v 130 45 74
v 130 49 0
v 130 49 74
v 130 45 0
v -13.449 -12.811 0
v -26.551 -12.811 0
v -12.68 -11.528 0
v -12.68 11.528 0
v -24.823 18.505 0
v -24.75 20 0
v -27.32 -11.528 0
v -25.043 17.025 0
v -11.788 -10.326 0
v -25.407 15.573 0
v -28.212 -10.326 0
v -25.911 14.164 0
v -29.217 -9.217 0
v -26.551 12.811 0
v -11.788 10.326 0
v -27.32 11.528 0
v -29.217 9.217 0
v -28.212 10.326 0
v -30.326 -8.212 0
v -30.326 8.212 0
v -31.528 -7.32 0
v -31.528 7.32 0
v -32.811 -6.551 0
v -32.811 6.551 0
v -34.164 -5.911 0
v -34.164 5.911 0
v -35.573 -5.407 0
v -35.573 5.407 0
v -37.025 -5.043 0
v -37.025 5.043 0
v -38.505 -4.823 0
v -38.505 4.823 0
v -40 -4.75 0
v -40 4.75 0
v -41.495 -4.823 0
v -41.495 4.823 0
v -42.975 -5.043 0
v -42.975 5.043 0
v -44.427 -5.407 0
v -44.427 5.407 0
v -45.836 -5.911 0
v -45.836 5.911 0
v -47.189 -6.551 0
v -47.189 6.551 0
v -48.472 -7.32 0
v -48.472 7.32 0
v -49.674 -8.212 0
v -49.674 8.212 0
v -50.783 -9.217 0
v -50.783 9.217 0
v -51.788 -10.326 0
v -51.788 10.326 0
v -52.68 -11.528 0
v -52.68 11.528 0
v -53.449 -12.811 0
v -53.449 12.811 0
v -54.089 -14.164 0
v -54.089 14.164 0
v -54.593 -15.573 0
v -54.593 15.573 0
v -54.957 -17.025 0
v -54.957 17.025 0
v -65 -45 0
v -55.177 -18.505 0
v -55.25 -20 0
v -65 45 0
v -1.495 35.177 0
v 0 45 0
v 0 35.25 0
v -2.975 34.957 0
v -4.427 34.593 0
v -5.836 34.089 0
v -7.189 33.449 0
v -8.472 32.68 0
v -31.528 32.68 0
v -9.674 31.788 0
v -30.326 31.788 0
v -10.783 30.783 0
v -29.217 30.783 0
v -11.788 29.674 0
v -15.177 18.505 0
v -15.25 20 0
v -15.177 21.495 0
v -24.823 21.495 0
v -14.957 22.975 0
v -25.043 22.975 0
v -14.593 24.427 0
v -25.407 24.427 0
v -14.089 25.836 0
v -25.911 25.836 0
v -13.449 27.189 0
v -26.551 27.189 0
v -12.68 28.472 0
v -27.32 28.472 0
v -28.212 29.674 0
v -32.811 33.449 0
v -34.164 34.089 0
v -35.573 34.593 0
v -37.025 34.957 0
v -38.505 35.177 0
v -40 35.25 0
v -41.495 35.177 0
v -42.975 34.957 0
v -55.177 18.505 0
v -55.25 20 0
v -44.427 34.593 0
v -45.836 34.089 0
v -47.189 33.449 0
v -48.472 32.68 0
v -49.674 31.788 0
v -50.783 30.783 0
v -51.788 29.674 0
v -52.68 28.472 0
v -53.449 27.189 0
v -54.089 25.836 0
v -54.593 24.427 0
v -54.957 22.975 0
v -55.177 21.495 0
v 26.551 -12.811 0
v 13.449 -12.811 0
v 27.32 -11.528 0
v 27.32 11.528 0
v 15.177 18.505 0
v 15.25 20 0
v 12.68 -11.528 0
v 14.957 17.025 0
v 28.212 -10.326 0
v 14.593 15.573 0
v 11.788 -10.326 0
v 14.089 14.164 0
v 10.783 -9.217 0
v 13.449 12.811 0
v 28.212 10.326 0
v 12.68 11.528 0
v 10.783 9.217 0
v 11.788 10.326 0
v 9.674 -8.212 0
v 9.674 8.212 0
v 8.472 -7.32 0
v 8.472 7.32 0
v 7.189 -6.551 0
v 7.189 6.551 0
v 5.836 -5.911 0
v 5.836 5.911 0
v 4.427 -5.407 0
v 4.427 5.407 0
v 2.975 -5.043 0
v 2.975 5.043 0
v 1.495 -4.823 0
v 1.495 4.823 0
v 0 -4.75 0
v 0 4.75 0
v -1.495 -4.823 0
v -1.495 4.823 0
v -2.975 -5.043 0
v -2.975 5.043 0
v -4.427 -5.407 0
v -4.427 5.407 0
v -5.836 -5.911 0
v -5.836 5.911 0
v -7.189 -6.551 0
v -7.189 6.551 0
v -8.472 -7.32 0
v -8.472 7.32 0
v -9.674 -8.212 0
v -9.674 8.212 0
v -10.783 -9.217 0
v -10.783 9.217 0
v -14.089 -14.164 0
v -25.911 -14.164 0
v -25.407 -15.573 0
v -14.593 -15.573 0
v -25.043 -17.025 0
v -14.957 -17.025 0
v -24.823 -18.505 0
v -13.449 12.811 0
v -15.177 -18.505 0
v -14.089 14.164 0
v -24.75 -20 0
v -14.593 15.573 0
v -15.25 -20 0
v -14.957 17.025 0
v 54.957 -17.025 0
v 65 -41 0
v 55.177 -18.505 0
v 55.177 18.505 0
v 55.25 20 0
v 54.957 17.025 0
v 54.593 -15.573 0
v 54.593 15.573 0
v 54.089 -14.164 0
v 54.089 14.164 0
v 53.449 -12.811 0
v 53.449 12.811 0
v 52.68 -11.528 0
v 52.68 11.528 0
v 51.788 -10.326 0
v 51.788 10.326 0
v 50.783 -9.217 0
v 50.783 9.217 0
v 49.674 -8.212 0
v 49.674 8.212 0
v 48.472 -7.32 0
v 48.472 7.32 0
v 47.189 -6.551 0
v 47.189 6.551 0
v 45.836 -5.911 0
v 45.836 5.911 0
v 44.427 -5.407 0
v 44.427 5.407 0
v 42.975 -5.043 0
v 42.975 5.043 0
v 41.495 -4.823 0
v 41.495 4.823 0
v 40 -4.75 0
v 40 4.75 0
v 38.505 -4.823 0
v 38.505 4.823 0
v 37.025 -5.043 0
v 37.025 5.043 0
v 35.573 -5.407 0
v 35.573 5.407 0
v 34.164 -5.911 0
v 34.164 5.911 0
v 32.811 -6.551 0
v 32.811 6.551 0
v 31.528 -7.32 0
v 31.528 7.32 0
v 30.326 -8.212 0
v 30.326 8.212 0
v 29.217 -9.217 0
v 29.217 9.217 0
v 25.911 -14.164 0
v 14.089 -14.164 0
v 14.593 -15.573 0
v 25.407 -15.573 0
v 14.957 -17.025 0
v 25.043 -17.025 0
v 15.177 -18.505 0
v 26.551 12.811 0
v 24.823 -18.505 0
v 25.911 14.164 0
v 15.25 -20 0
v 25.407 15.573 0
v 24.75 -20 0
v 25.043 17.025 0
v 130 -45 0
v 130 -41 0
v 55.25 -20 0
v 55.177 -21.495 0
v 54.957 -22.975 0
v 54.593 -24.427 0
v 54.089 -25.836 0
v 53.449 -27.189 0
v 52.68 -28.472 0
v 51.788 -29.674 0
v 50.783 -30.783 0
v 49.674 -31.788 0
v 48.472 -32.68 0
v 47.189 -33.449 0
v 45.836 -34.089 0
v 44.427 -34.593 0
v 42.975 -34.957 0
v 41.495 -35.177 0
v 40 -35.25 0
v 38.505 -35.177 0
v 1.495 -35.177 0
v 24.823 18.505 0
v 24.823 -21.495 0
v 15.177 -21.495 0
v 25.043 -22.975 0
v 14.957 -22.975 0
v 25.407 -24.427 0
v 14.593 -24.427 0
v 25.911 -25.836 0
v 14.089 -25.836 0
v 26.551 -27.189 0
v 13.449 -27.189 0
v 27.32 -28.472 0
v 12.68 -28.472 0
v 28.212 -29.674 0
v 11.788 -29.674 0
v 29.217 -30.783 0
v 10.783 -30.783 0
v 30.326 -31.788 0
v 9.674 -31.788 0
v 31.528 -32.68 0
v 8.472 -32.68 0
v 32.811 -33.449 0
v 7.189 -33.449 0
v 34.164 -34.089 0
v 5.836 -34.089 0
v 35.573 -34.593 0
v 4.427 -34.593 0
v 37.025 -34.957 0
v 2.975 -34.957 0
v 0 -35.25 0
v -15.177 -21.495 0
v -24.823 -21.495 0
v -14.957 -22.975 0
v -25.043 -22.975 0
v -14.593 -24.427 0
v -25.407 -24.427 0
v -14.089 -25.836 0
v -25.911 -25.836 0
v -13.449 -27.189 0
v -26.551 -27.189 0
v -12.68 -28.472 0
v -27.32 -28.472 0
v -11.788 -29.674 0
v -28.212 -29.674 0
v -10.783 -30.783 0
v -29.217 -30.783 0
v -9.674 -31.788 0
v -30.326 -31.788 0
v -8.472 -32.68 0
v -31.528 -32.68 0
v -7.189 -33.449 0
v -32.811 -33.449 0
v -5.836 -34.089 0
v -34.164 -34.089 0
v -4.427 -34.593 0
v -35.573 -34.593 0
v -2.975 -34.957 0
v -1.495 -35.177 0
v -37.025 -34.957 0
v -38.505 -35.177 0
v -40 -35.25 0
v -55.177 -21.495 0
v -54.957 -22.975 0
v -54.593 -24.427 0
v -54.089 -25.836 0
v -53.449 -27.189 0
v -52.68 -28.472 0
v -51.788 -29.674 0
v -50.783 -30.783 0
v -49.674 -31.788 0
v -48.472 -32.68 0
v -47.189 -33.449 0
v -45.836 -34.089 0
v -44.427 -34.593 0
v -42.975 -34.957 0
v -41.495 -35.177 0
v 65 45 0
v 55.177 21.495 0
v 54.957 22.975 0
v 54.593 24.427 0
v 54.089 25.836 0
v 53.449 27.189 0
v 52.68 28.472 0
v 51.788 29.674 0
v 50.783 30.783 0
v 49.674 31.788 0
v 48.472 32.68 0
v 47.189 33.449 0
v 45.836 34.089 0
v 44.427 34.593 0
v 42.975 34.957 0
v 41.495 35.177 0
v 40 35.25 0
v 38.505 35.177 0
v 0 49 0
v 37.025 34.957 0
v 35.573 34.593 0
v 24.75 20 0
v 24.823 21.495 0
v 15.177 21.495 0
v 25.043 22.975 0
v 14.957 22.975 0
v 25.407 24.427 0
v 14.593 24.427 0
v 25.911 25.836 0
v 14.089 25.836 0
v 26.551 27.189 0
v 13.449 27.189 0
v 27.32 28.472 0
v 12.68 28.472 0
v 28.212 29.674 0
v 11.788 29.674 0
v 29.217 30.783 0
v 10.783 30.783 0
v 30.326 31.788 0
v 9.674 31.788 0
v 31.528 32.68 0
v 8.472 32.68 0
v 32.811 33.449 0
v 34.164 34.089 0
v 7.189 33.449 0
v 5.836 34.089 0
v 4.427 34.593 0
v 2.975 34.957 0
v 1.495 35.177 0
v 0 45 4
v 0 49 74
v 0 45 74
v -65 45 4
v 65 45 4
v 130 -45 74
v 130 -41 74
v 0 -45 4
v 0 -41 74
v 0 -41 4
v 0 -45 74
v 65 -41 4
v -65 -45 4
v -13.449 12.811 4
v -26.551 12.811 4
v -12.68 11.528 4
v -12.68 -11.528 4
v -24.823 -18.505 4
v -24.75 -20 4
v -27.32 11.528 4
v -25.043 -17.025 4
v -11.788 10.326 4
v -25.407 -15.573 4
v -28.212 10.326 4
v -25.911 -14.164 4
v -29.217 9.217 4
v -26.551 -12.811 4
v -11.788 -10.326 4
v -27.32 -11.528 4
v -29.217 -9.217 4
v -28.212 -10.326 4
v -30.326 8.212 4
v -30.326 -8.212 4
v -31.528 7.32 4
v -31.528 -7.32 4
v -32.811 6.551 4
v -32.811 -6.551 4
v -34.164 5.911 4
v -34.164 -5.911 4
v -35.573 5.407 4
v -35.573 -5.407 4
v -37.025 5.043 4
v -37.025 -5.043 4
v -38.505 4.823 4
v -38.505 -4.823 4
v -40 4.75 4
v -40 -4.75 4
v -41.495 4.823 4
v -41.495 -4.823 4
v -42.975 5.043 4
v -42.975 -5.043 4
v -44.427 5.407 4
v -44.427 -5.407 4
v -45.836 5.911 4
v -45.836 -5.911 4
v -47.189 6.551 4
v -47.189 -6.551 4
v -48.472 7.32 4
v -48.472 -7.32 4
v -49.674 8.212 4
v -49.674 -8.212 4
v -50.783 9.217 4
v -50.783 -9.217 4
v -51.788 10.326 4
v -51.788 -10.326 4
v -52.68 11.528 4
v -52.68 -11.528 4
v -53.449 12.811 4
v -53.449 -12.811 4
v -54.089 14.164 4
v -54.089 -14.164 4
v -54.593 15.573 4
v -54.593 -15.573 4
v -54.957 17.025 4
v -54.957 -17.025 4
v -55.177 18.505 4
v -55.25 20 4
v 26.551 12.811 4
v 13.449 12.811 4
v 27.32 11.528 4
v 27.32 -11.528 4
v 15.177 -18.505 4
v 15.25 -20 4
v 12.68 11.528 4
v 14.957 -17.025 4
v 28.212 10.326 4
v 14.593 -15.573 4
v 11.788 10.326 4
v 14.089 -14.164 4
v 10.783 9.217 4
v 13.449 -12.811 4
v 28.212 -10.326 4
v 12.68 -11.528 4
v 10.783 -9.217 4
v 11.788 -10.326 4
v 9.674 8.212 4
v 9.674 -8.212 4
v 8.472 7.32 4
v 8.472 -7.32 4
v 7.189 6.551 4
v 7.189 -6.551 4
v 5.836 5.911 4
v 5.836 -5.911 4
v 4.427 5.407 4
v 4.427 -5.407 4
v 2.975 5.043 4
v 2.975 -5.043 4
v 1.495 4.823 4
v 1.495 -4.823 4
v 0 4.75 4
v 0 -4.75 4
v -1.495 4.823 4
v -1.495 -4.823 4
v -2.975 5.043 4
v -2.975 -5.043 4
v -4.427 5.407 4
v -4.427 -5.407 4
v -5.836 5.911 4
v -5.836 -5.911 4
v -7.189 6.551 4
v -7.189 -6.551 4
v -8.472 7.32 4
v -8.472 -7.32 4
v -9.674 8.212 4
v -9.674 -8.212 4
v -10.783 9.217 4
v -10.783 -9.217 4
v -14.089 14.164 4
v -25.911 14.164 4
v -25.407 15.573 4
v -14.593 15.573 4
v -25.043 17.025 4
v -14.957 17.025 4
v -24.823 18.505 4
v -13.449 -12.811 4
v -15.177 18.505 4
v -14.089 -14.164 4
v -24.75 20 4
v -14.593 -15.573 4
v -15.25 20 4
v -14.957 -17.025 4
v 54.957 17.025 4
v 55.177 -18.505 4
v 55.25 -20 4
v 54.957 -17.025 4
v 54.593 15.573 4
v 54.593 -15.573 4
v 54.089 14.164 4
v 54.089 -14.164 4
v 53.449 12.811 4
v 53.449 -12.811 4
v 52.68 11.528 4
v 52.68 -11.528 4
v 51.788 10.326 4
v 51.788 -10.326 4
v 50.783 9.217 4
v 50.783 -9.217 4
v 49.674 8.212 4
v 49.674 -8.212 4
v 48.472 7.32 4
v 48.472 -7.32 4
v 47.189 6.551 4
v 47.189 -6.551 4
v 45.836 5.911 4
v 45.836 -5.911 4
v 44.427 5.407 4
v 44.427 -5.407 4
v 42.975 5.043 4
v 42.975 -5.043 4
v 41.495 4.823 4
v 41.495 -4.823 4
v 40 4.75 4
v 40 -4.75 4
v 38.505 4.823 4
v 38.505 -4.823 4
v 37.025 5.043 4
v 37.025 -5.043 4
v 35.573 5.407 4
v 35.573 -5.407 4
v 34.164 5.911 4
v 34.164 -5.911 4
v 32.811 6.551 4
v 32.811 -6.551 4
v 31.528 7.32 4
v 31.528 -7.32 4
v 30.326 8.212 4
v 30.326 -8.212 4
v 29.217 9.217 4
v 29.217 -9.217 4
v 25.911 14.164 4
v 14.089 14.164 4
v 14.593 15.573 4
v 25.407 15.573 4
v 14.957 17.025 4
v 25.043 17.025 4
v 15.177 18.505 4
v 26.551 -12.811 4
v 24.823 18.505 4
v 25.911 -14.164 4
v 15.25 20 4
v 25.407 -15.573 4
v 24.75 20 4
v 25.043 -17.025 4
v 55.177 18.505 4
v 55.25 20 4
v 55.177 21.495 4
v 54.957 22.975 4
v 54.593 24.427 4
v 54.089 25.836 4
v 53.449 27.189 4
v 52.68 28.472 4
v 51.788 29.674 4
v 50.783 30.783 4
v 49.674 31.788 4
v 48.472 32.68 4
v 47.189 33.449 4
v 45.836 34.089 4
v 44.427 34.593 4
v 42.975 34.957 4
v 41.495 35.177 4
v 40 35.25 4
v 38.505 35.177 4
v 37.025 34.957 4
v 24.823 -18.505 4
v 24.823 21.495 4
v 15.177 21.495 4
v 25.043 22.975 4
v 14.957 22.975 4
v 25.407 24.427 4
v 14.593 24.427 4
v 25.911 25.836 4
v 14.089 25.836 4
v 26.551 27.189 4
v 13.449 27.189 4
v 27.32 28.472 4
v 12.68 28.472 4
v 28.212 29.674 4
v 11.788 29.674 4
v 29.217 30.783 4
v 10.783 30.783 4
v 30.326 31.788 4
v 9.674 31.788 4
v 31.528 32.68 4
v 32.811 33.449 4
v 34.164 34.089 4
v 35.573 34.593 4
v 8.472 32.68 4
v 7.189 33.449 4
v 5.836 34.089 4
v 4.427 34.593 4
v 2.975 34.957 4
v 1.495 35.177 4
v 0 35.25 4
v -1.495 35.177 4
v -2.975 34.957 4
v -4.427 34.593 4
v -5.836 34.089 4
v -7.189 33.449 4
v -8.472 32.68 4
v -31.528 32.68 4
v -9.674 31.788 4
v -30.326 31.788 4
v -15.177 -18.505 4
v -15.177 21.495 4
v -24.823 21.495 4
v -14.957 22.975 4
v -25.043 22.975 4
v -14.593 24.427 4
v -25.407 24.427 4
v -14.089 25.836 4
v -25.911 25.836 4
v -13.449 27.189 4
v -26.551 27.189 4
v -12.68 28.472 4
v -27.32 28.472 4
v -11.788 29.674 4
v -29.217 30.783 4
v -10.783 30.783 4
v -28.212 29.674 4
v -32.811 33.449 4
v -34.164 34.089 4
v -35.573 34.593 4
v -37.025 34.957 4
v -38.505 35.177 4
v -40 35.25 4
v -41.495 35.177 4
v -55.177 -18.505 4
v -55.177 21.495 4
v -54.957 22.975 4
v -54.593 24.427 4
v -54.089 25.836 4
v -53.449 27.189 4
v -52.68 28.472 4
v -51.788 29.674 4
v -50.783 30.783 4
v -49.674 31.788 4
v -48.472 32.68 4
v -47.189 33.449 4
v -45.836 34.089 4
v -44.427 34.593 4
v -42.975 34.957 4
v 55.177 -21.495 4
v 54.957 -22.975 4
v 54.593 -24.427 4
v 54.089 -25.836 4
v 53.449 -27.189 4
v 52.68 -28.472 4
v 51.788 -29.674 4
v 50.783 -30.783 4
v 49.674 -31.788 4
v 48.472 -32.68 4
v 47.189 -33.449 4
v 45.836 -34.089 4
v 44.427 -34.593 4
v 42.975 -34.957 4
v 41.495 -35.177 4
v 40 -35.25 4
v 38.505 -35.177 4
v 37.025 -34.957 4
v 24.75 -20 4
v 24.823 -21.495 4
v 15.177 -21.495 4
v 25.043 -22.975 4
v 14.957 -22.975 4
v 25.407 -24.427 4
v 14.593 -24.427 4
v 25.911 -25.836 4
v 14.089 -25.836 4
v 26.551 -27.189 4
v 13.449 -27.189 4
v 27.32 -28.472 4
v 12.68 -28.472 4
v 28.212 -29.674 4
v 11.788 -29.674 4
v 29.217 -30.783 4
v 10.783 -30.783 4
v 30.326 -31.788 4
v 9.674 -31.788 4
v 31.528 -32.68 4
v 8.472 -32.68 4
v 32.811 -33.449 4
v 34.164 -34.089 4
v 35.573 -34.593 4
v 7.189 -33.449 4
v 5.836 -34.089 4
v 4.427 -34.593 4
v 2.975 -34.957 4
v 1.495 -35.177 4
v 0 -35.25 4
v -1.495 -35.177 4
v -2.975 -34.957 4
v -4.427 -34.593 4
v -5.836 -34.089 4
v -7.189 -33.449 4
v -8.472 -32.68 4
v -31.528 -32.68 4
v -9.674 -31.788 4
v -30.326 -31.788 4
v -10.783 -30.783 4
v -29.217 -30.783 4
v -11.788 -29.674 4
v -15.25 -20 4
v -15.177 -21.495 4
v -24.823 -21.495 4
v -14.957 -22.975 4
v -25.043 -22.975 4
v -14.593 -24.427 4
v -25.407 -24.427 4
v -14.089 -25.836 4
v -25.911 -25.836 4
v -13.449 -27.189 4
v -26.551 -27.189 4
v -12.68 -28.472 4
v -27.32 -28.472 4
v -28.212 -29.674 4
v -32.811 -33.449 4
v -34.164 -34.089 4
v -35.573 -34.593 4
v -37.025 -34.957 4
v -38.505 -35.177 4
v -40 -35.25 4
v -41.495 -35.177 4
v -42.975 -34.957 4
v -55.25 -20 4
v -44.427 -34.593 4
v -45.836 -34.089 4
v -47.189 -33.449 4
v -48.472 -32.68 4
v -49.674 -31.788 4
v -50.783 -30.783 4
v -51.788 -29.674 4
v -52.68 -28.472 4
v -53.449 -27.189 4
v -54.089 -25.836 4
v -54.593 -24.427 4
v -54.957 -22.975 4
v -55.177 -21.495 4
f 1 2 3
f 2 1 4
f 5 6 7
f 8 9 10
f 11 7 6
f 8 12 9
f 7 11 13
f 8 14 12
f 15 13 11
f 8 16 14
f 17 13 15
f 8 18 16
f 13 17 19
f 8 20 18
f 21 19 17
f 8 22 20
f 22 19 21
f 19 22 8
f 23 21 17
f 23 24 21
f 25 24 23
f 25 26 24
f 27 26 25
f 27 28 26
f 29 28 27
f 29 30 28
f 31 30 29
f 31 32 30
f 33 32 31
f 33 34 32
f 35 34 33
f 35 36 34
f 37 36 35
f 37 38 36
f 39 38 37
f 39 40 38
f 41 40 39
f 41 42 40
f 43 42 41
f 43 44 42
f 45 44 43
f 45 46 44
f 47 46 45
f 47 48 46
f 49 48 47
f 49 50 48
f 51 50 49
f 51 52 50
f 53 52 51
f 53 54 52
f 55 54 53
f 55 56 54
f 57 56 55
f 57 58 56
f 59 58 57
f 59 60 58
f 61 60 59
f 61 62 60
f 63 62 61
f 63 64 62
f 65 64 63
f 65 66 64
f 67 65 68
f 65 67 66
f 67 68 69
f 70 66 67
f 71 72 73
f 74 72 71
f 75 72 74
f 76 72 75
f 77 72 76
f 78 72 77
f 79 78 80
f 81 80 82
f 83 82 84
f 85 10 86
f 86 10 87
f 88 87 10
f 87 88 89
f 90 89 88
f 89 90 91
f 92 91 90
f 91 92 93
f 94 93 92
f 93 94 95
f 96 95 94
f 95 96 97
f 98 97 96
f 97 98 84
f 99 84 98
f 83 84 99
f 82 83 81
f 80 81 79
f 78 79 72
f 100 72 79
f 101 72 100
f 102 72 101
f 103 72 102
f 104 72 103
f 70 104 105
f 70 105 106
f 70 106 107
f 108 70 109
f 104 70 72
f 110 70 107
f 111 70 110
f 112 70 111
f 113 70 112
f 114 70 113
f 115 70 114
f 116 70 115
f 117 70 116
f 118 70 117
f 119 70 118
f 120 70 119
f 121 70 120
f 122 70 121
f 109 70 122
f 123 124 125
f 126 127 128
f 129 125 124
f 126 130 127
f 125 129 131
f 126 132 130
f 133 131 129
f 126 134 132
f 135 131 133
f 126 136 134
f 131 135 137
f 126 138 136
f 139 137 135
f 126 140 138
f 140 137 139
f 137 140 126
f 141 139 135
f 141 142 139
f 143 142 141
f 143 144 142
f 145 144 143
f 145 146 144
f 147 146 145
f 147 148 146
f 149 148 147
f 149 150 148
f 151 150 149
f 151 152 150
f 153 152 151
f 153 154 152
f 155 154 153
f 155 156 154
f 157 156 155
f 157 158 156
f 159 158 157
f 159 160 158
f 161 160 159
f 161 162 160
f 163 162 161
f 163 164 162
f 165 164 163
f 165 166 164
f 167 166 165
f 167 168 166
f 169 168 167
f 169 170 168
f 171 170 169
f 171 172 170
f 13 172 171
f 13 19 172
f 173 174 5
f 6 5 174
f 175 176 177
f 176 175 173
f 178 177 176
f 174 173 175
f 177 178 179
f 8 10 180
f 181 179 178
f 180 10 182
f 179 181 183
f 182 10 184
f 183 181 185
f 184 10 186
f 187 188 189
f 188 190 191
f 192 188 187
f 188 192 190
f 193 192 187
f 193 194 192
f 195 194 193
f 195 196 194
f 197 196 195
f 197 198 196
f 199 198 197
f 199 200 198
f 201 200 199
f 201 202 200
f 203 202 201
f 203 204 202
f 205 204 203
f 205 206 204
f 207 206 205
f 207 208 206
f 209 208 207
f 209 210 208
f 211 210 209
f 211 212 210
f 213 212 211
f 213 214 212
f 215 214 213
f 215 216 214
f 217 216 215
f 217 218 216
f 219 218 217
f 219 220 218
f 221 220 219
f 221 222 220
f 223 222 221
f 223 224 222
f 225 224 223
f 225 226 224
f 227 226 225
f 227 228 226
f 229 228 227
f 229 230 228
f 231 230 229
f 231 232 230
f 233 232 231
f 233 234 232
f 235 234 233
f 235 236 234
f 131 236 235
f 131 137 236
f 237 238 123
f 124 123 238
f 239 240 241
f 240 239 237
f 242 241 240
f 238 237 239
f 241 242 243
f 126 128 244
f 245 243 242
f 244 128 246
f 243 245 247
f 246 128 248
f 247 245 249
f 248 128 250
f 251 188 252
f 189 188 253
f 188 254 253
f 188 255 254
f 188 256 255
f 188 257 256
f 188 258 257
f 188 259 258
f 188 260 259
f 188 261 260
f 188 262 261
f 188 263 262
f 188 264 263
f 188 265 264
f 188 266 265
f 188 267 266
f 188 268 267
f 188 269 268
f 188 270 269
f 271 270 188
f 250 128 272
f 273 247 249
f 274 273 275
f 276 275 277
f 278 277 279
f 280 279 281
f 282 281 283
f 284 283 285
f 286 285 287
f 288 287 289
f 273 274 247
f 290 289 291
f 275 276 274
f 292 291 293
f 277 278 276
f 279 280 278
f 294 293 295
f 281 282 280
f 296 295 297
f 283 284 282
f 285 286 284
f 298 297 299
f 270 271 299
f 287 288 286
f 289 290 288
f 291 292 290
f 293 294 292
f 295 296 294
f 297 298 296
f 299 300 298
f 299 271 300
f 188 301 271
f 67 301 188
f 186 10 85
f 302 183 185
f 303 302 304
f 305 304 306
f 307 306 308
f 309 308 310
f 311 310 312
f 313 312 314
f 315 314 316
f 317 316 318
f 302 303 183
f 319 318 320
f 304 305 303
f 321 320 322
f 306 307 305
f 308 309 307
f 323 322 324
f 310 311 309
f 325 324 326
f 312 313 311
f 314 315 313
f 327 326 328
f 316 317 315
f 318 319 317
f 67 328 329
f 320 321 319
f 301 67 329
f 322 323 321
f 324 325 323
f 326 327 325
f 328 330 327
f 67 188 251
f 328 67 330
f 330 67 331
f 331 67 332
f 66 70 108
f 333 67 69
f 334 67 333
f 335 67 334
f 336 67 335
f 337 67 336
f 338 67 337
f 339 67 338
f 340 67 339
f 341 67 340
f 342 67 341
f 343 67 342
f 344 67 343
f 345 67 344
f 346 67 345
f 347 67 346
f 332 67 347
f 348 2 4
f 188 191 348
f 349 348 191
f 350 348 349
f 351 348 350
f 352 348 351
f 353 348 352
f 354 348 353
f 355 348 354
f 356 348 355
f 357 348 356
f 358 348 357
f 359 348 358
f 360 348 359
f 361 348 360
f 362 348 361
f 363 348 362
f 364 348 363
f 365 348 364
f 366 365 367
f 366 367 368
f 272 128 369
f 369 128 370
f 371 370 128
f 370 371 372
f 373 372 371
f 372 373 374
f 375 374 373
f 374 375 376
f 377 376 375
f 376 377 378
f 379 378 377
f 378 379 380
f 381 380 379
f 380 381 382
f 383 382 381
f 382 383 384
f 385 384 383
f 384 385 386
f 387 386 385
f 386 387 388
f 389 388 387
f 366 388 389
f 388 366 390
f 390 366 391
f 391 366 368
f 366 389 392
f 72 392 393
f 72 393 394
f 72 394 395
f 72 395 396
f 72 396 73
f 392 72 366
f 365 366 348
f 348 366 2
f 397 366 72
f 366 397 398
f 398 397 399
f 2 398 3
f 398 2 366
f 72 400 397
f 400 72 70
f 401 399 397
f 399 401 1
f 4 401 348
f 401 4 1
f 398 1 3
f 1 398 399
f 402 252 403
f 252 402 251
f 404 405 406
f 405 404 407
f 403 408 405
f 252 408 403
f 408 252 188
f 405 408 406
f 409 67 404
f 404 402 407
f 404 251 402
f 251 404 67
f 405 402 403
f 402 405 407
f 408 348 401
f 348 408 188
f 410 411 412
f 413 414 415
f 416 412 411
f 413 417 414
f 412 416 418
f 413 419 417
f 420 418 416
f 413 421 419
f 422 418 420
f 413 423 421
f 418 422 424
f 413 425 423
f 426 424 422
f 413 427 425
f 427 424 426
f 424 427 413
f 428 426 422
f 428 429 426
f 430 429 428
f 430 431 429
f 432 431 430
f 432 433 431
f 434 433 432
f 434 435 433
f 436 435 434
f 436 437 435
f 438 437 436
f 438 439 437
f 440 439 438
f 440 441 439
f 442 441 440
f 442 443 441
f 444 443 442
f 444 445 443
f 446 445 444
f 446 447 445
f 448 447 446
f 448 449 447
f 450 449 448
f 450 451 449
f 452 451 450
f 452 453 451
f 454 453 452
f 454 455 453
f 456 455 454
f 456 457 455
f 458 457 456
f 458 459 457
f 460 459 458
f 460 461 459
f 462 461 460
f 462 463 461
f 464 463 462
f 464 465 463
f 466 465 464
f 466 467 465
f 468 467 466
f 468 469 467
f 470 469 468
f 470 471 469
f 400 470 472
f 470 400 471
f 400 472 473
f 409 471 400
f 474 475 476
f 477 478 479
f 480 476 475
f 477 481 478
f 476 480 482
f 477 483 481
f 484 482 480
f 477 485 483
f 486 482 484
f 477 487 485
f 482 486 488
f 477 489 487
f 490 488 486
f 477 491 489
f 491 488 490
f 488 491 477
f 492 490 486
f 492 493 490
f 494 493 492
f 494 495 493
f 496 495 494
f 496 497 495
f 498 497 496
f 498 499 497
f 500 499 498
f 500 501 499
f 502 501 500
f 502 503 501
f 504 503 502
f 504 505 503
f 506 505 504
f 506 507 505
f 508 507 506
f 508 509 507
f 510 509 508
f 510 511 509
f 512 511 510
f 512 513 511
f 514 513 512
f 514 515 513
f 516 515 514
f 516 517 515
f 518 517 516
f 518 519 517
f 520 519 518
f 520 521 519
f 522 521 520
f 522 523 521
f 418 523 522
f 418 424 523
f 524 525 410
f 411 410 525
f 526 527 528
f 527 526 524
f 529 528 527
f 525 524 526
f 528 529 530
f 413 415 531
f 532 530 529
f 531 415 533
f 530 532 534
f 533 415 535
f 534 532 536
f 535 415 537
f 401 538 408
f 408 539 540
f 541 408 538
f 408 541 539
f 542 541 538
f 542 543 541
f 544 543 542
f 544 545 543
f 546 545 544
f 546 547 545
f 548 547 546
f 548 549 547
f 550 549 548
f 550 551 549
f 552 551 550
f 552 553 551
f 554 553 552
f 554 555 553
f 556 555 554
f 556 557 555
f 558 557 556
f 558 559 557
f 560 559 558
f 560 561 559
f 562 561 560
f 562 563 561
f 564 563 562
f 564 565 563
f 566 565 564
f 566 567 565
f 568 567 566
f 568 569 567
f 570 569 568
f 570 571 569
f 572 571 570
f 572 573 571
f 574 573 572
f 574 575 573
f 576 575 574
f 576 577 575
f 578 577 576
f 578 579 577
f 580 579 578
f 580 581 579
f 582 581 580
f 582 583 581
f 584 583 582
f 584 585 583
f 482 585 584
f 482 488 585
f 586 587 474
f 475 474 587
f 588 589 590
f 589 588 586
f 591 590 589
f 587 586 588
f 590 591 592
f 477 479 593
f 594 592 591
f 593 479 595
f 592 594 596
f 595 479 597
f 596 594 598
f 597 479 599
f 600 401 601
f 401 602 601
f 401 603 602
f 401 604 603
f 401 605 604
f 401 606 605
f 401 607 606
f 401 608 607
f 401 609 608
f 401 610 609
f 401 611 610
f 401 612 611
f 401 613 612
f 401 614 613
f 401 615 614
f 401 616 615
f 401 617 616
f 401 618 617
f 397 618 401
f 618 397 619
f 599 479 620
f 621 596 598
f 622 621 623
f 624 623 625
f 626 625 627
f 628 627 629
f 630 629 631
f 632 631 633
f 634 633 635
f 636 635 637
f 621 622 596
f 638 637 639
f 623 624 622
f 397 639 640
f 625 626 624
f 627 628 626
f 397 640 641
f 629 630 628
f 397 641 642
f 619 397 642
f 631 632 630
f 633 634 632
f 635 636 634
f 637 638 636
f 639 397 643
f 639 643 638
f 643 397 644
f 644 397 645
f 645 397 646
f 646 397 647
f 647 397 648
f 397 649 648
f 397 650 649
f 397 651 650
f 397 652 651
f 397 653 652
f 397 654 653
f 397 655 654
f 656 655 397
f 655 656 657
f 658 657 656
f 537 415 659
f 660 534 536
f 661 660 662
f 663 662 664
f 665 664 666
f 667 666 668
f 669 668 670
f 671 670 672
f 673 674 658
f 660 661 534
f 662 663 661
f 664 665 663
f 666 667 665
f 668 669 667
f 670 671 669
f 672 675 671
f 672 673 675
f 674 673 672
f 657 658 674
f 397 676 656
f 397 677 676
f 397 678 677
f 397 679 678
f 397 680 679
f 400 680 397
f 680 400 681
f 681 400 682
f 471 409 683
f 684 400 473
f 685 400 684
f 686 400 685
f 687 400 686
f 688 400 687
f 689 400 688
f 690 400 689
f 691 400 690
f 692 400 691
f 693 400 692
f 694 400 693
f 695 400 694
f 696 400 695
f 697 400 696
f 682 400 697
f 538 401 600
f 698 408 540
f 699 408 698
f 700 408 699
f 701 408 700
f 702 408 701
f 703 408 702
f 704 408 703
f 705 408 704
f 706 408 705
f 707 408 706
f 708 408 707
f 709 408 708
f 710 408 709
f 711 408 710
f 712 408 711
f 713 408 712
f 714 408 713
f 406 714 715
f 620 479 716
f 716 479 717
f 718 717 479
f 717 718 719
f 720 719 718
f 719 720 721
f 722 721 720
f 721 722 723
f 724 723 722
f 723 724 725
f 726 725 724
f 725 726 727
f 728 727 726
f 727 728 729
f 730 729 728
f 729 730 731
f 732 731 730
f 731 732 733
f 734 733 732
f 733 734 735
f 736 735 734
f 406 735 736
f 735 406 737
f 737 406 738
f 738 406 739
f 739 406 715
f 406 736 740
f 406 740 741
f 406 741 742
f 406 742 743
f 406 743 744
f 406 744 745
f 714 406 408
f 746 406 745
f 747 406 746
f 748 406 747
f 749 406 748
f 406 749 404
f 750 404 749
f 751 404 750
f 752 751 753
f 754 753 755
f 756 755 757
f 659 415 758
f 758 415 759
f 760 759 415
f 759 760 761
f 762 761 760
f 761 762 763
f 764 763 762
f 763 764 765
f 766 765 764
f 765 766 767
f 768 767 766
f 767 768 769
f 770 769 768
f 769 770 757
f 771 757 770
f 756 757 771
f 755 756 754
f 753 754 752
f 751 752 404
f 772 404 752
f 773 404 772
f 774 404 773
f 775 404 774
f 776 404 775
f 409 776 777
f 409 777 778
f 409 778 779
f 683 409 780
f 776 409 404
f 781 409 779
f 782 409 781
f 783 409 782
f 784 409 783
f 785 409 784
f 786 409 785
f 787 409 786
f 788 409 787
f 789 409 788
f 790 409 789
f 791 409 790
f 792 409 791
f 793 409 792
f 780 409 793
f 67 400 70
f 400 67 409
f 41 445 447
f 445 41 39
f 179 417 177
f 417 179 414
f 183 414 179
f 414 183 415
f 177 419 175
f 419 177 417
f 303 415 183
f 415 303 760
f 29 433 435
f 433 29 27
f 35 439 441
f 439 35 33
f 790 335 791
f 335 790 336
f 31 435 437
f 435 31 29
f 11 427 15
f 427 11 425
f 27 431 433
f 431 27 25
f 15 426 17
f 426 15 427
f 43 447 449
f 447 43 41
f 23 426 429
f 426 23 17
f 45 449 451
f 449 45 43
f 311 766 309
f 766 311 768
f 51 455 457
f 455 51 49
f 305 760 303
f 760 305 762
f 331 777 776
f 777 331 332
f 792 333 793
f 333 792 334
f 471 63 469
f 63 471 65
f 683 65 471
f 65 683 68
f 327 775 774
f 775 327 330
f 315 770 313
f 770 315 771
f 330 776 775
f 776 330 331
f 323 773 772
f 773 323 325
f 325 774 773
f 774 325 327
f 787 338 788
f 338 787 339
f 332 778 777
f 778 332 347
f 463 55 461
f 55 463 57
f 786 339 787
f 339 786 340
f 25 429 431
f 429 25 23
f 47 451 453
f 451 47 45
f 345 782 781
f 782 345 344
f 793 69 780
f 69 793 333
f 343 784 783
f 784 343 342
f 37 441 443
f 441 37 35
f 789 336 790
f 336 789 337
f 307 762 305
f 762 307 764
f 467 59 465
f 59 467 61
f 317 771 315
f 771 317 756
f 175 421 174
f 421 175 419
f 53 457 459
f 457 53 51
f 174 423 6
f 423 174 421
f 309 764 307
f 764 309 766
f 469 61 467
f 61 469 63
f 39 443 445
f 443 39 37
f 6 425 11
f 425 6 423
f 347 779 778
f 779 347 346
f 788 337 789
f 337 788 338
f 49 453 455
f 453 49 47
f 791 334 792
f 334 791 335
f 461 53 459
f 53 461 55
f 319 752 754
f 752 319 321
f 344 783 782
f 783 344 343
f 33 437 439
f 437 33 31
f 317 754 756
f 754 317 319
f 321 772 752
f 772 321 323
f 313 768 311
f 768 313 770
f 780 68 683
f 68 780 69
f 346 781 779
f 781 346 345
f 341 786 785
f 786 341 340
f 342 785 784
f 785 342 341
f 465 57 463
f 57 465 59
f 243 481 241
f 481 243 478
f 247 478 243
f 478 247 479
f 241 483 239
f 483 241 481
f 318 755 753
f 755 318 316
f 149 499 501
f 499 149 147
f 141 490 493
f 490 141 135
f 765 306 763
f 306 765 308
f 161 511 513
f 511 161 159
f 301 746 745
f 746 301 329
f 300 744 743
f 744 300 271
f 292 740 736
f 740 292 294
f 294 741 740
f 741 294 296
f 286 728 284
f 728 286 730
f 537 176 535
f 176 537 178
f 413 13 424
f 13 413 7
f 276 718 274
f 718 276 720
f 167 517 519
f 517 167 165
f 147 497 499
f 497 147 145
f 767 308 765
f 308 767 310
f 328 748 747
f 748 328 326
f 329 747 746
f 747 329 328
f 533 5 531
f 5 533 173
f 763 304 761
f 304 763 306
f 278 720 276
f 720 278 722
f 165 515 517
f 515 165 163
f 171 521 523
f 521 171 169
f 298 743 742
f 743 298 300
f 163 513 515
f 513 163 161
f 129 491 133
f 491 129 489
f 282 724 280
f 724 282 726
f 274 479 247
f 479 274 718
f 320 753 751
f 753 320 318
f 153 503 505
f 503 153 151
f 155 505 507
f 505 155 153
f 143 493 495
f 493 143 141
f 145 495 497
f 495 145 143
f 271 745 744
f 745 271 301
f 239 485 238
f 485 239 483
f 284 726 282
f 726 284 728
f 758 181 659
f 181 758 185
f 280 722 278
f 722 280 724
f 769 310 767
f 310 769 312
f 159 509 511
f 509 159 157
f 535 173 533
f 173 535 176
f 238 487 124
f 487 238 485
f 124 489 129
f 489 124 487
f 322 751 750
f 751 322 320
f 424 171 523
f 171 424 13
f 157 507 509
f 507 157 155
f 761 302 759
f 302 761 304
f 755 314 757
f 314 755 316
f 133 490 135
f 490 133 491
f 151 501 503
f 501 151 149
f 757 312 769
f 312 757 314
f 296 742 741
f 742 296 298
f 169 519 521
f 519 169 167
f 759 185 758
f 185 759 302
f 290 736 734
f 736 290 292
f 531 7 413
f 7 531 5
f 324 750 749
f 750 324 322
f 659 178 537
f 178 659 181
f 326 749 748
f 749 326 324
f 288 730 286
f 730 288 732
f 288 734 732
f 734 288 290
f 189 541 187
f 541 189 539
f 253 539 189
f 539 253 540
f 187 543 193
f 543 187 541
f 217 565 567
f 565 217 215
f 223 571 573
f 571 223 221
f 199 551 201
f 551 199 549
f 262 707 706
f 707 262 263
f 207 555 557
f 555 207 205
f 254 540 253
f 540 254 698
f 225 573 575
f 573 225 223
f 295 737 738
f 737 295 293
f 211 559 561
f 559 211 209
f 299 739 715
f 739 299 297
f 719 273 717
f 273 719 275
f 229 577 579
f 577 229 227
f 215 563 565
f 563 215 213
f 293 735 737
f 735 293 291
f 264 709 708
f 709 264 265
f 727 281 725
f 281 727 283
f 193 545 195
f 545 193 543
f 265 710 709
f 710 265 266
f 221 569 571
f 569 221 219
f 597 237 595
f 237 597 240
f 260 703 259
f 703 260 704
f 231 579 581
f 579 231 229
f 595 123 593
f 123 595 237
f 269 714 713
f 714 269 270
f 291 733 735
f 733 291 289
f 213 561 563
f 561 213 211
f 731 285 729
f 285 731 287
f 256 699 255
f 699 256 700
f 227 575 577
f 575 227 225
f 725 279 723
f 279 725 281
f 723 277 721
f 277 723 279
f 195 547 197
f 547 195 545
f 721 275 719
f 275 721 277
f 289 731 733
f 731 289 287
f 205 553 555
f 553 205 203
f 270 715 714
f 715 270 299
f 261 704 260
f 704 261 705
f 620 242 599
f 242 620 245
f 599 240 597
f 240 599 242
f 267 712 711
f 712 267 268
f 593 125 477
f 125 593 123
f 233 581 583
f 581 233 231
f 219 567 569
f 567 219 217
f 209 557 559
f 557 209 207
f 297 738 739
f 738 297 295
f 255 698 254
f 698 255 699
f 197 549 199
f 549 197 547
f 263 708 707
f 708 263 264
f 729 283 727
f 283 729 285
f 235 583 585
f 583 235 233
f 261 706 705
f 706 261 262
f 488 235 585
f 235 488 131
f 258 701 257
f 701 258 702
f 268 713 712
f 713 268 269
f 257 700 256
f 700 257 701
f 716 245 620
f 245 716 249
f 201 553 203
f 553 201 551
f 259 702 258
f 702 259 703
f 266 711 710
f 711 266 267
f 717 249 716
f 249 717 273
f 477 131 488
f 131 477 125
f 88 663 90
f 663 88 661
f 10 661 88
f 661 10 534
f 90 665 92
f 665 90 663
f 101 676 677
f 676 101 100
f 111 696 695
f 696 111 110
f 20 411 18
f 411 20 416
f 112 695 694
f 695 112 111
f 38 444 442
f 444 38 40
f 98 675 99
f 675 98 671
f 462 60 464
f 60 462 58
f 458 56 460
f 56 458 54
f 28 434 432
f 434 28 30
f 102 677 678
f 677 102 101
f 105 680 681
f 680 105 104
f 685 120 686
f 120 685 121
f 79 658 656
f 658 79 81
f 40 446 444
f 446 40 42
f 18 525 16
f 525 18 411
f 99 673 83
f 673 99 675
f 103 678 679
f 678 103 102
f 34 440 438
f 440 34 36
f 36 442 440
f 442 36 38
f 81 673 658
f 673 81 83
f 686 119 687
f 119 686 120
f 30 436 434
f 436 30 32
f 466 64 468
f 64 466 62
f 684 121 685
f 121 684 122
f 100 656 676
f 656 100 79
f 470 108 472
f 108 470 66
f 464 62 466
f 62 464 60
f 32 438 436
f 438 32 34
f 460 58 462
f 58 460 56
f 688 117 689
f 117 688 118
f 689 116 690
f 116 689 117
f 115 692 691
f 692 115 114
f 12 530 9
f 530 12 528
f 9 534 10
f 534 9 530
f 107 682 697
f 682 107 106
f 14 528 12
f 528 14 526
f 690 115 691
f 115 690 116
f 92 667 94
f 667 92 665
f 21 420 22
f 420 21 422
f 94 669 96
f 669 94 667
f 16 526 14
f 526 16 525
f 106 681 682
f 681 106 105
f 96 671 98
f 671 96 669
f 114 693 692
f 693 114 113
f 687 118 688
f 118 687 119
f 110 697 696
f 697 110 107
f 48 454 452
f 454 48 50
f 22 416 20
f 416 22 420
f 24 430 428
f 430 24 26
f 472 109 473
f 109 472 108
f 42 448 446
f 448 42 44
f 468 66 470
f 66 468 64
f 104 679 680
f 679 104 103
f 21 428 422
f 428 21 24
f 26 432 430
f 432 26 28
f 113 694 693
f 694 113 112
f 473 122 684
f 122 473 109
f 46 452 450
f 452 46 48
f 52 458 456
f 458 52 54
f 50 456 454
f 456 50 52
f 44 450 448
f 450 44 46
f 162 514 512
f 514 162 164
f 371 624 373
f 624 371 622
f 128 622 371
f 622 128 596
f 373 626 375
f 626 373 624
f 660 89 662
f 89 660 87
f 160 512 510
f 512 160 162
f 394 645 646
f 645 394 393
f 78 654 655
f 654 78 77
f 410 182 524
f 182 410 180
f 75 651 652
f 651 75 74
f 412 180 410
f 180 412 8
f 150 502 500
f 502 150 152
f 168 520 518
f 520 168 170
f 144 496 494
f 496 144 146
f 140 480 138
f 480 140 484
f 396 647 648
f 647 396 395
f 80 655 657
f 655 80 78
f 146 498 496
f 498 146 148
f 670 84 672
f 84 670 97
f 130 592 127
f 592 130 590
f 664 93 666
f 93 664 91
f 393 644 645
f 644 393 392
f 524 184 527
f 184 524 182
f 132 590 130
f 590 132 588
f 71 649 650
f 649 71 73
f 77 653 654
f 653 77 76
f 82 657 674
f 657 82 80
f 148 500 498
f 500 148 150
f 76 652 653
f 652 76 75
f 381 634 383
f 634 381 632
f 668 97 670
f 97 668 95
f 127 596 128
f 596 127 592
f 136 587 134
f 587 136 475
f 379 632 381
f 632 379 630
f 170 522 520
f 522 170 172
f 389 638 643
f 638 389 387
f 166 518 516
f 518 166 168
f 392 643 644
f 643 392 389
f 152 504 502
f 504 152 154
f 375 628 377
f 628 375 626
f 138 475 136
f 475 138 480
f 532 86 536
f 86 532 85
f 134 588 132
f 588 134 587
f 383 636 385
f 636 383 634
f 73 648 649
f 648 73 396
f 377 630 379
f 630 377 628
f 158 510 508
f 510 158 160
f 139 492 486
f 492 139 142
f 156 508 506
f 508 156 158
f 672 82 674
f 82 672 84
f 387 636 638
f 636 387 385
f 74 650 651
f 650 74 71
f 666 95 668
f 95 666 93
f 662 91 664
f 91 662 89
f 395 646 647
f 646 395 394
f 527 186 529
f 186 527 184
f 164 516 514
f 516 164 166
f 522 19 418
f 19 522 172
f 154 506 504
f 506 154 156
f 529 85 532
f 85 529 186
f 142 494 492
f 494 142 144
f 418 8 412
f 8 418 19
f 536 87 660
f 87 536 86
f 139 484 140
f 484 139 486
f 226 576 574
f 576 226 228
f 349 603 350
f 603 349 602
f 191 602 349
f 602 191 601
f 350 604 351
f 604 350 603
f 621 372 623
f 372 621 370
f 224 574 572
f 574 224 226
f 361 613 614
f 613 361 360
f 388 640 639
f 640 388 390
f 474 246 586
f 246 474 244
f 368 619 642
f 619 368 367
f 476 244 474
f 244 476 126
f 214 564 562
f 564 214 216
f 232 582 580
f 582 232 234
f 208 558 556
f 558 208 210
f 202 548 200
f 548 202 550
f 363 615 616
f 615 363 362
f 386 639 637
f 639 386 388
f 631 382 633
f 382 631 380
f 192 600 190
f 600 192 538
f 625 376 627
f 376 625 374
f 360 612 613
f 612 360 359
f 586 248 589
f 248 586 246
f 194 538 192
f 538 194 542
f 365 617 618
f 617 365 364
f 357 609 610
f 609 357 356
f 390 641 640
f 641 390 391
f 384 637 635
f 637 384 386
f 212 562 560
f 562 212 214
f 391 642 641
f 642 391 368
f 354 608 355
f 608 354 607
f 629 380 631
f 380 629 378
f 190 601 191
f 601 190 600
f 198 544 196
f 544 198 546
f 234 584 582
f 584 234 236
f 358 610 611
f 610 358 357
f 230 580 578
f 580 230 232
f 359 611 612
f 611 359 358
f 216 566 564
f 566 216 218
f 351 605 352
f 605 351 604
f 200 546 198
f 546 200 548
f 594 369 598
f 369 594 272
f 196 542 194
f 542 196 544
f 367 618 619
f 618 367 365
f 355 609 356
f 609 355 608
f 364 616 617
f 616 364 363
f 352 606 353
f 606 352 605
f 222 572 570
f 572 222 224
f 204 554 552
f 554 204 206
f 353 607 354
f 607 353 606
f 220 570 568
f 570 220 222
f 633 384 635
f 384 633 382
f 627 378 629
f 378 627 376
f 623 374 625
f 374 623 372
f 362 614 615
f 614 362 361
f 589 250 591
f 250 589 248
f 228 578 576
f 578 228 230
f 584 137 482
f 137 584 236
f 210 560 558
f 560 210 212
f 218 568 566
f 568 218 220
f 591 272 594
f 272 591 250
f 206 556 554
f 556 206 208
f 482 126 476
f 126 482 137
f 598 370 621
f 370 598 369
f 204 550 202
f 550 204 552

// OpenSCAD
// Rack for six 50 mL conical tubes.
// Print orientation: Flat plate on bed (z=0), walls rising to z=70.
// After printing, flip over so walls support tubes.

// Plate dimensions
L     = 130;   // Length (X)
W     = 90;    // Width (Y)
t     = 4;     // Plate thickness (Z)

// Hole dimensions
n_holes = 6;
hole_d  = 30.5;

// Grid layout
// 3 columns along X, 2 rows along Y
// Spacing 40 mm centre-to-centre
// X positions: -40, 0, 40
// Y positions: -20, 20
x_pos = [-40, 0, 40];
y_pos = [-20, 20];

// Wall dimensions
wall_h = 70; // Height of walls from plate (z=4 to z=74)
wall_t = 4;  // Wall thickness (Y)

// Derived positions (centred on origin)
// Plate is centred: X -65..65, Y -45..45
// Walls are flush with plate edges (Y = +/- 45)

$fn = 64;

module side_wall(side) {
    // side = 1 for right (+Y), -1 for left (-Y)
    // Wall runs along X, thickness in Y
    // Flush with plate edge means starting at Y = W/2
    translate([0, side * (W / 2), 0]) {
        // Base of wall (part of plate thickness)
        cube([L, wall_t, t]);
        // Rising part of wall
        translate([0, 0, t]) cube([L, wall_t, wall_h]);
    }
}

difference() {
    union() {
        // 1. Main Plate
        translate([-L / 2, -W / 2, 0]) cube([L, W, t]);

        // 2. Side Walls
        side_wall(1);
        side_wall(-1);
    }

    // 3. Cut out holes for tubes
    for (i = [0 : n_holes - 1]) {
        row = i / 3; // 0 or 1
        col = i % 3; // 0, 1, 2
        x = x_pos[col];
        y = y_pos[row];
        // Cut hole through plate and slightly above to ensure clean exit
        translate([x, y, 0]) cylinder(h = t + 1, d = hole_d);
    }
}
